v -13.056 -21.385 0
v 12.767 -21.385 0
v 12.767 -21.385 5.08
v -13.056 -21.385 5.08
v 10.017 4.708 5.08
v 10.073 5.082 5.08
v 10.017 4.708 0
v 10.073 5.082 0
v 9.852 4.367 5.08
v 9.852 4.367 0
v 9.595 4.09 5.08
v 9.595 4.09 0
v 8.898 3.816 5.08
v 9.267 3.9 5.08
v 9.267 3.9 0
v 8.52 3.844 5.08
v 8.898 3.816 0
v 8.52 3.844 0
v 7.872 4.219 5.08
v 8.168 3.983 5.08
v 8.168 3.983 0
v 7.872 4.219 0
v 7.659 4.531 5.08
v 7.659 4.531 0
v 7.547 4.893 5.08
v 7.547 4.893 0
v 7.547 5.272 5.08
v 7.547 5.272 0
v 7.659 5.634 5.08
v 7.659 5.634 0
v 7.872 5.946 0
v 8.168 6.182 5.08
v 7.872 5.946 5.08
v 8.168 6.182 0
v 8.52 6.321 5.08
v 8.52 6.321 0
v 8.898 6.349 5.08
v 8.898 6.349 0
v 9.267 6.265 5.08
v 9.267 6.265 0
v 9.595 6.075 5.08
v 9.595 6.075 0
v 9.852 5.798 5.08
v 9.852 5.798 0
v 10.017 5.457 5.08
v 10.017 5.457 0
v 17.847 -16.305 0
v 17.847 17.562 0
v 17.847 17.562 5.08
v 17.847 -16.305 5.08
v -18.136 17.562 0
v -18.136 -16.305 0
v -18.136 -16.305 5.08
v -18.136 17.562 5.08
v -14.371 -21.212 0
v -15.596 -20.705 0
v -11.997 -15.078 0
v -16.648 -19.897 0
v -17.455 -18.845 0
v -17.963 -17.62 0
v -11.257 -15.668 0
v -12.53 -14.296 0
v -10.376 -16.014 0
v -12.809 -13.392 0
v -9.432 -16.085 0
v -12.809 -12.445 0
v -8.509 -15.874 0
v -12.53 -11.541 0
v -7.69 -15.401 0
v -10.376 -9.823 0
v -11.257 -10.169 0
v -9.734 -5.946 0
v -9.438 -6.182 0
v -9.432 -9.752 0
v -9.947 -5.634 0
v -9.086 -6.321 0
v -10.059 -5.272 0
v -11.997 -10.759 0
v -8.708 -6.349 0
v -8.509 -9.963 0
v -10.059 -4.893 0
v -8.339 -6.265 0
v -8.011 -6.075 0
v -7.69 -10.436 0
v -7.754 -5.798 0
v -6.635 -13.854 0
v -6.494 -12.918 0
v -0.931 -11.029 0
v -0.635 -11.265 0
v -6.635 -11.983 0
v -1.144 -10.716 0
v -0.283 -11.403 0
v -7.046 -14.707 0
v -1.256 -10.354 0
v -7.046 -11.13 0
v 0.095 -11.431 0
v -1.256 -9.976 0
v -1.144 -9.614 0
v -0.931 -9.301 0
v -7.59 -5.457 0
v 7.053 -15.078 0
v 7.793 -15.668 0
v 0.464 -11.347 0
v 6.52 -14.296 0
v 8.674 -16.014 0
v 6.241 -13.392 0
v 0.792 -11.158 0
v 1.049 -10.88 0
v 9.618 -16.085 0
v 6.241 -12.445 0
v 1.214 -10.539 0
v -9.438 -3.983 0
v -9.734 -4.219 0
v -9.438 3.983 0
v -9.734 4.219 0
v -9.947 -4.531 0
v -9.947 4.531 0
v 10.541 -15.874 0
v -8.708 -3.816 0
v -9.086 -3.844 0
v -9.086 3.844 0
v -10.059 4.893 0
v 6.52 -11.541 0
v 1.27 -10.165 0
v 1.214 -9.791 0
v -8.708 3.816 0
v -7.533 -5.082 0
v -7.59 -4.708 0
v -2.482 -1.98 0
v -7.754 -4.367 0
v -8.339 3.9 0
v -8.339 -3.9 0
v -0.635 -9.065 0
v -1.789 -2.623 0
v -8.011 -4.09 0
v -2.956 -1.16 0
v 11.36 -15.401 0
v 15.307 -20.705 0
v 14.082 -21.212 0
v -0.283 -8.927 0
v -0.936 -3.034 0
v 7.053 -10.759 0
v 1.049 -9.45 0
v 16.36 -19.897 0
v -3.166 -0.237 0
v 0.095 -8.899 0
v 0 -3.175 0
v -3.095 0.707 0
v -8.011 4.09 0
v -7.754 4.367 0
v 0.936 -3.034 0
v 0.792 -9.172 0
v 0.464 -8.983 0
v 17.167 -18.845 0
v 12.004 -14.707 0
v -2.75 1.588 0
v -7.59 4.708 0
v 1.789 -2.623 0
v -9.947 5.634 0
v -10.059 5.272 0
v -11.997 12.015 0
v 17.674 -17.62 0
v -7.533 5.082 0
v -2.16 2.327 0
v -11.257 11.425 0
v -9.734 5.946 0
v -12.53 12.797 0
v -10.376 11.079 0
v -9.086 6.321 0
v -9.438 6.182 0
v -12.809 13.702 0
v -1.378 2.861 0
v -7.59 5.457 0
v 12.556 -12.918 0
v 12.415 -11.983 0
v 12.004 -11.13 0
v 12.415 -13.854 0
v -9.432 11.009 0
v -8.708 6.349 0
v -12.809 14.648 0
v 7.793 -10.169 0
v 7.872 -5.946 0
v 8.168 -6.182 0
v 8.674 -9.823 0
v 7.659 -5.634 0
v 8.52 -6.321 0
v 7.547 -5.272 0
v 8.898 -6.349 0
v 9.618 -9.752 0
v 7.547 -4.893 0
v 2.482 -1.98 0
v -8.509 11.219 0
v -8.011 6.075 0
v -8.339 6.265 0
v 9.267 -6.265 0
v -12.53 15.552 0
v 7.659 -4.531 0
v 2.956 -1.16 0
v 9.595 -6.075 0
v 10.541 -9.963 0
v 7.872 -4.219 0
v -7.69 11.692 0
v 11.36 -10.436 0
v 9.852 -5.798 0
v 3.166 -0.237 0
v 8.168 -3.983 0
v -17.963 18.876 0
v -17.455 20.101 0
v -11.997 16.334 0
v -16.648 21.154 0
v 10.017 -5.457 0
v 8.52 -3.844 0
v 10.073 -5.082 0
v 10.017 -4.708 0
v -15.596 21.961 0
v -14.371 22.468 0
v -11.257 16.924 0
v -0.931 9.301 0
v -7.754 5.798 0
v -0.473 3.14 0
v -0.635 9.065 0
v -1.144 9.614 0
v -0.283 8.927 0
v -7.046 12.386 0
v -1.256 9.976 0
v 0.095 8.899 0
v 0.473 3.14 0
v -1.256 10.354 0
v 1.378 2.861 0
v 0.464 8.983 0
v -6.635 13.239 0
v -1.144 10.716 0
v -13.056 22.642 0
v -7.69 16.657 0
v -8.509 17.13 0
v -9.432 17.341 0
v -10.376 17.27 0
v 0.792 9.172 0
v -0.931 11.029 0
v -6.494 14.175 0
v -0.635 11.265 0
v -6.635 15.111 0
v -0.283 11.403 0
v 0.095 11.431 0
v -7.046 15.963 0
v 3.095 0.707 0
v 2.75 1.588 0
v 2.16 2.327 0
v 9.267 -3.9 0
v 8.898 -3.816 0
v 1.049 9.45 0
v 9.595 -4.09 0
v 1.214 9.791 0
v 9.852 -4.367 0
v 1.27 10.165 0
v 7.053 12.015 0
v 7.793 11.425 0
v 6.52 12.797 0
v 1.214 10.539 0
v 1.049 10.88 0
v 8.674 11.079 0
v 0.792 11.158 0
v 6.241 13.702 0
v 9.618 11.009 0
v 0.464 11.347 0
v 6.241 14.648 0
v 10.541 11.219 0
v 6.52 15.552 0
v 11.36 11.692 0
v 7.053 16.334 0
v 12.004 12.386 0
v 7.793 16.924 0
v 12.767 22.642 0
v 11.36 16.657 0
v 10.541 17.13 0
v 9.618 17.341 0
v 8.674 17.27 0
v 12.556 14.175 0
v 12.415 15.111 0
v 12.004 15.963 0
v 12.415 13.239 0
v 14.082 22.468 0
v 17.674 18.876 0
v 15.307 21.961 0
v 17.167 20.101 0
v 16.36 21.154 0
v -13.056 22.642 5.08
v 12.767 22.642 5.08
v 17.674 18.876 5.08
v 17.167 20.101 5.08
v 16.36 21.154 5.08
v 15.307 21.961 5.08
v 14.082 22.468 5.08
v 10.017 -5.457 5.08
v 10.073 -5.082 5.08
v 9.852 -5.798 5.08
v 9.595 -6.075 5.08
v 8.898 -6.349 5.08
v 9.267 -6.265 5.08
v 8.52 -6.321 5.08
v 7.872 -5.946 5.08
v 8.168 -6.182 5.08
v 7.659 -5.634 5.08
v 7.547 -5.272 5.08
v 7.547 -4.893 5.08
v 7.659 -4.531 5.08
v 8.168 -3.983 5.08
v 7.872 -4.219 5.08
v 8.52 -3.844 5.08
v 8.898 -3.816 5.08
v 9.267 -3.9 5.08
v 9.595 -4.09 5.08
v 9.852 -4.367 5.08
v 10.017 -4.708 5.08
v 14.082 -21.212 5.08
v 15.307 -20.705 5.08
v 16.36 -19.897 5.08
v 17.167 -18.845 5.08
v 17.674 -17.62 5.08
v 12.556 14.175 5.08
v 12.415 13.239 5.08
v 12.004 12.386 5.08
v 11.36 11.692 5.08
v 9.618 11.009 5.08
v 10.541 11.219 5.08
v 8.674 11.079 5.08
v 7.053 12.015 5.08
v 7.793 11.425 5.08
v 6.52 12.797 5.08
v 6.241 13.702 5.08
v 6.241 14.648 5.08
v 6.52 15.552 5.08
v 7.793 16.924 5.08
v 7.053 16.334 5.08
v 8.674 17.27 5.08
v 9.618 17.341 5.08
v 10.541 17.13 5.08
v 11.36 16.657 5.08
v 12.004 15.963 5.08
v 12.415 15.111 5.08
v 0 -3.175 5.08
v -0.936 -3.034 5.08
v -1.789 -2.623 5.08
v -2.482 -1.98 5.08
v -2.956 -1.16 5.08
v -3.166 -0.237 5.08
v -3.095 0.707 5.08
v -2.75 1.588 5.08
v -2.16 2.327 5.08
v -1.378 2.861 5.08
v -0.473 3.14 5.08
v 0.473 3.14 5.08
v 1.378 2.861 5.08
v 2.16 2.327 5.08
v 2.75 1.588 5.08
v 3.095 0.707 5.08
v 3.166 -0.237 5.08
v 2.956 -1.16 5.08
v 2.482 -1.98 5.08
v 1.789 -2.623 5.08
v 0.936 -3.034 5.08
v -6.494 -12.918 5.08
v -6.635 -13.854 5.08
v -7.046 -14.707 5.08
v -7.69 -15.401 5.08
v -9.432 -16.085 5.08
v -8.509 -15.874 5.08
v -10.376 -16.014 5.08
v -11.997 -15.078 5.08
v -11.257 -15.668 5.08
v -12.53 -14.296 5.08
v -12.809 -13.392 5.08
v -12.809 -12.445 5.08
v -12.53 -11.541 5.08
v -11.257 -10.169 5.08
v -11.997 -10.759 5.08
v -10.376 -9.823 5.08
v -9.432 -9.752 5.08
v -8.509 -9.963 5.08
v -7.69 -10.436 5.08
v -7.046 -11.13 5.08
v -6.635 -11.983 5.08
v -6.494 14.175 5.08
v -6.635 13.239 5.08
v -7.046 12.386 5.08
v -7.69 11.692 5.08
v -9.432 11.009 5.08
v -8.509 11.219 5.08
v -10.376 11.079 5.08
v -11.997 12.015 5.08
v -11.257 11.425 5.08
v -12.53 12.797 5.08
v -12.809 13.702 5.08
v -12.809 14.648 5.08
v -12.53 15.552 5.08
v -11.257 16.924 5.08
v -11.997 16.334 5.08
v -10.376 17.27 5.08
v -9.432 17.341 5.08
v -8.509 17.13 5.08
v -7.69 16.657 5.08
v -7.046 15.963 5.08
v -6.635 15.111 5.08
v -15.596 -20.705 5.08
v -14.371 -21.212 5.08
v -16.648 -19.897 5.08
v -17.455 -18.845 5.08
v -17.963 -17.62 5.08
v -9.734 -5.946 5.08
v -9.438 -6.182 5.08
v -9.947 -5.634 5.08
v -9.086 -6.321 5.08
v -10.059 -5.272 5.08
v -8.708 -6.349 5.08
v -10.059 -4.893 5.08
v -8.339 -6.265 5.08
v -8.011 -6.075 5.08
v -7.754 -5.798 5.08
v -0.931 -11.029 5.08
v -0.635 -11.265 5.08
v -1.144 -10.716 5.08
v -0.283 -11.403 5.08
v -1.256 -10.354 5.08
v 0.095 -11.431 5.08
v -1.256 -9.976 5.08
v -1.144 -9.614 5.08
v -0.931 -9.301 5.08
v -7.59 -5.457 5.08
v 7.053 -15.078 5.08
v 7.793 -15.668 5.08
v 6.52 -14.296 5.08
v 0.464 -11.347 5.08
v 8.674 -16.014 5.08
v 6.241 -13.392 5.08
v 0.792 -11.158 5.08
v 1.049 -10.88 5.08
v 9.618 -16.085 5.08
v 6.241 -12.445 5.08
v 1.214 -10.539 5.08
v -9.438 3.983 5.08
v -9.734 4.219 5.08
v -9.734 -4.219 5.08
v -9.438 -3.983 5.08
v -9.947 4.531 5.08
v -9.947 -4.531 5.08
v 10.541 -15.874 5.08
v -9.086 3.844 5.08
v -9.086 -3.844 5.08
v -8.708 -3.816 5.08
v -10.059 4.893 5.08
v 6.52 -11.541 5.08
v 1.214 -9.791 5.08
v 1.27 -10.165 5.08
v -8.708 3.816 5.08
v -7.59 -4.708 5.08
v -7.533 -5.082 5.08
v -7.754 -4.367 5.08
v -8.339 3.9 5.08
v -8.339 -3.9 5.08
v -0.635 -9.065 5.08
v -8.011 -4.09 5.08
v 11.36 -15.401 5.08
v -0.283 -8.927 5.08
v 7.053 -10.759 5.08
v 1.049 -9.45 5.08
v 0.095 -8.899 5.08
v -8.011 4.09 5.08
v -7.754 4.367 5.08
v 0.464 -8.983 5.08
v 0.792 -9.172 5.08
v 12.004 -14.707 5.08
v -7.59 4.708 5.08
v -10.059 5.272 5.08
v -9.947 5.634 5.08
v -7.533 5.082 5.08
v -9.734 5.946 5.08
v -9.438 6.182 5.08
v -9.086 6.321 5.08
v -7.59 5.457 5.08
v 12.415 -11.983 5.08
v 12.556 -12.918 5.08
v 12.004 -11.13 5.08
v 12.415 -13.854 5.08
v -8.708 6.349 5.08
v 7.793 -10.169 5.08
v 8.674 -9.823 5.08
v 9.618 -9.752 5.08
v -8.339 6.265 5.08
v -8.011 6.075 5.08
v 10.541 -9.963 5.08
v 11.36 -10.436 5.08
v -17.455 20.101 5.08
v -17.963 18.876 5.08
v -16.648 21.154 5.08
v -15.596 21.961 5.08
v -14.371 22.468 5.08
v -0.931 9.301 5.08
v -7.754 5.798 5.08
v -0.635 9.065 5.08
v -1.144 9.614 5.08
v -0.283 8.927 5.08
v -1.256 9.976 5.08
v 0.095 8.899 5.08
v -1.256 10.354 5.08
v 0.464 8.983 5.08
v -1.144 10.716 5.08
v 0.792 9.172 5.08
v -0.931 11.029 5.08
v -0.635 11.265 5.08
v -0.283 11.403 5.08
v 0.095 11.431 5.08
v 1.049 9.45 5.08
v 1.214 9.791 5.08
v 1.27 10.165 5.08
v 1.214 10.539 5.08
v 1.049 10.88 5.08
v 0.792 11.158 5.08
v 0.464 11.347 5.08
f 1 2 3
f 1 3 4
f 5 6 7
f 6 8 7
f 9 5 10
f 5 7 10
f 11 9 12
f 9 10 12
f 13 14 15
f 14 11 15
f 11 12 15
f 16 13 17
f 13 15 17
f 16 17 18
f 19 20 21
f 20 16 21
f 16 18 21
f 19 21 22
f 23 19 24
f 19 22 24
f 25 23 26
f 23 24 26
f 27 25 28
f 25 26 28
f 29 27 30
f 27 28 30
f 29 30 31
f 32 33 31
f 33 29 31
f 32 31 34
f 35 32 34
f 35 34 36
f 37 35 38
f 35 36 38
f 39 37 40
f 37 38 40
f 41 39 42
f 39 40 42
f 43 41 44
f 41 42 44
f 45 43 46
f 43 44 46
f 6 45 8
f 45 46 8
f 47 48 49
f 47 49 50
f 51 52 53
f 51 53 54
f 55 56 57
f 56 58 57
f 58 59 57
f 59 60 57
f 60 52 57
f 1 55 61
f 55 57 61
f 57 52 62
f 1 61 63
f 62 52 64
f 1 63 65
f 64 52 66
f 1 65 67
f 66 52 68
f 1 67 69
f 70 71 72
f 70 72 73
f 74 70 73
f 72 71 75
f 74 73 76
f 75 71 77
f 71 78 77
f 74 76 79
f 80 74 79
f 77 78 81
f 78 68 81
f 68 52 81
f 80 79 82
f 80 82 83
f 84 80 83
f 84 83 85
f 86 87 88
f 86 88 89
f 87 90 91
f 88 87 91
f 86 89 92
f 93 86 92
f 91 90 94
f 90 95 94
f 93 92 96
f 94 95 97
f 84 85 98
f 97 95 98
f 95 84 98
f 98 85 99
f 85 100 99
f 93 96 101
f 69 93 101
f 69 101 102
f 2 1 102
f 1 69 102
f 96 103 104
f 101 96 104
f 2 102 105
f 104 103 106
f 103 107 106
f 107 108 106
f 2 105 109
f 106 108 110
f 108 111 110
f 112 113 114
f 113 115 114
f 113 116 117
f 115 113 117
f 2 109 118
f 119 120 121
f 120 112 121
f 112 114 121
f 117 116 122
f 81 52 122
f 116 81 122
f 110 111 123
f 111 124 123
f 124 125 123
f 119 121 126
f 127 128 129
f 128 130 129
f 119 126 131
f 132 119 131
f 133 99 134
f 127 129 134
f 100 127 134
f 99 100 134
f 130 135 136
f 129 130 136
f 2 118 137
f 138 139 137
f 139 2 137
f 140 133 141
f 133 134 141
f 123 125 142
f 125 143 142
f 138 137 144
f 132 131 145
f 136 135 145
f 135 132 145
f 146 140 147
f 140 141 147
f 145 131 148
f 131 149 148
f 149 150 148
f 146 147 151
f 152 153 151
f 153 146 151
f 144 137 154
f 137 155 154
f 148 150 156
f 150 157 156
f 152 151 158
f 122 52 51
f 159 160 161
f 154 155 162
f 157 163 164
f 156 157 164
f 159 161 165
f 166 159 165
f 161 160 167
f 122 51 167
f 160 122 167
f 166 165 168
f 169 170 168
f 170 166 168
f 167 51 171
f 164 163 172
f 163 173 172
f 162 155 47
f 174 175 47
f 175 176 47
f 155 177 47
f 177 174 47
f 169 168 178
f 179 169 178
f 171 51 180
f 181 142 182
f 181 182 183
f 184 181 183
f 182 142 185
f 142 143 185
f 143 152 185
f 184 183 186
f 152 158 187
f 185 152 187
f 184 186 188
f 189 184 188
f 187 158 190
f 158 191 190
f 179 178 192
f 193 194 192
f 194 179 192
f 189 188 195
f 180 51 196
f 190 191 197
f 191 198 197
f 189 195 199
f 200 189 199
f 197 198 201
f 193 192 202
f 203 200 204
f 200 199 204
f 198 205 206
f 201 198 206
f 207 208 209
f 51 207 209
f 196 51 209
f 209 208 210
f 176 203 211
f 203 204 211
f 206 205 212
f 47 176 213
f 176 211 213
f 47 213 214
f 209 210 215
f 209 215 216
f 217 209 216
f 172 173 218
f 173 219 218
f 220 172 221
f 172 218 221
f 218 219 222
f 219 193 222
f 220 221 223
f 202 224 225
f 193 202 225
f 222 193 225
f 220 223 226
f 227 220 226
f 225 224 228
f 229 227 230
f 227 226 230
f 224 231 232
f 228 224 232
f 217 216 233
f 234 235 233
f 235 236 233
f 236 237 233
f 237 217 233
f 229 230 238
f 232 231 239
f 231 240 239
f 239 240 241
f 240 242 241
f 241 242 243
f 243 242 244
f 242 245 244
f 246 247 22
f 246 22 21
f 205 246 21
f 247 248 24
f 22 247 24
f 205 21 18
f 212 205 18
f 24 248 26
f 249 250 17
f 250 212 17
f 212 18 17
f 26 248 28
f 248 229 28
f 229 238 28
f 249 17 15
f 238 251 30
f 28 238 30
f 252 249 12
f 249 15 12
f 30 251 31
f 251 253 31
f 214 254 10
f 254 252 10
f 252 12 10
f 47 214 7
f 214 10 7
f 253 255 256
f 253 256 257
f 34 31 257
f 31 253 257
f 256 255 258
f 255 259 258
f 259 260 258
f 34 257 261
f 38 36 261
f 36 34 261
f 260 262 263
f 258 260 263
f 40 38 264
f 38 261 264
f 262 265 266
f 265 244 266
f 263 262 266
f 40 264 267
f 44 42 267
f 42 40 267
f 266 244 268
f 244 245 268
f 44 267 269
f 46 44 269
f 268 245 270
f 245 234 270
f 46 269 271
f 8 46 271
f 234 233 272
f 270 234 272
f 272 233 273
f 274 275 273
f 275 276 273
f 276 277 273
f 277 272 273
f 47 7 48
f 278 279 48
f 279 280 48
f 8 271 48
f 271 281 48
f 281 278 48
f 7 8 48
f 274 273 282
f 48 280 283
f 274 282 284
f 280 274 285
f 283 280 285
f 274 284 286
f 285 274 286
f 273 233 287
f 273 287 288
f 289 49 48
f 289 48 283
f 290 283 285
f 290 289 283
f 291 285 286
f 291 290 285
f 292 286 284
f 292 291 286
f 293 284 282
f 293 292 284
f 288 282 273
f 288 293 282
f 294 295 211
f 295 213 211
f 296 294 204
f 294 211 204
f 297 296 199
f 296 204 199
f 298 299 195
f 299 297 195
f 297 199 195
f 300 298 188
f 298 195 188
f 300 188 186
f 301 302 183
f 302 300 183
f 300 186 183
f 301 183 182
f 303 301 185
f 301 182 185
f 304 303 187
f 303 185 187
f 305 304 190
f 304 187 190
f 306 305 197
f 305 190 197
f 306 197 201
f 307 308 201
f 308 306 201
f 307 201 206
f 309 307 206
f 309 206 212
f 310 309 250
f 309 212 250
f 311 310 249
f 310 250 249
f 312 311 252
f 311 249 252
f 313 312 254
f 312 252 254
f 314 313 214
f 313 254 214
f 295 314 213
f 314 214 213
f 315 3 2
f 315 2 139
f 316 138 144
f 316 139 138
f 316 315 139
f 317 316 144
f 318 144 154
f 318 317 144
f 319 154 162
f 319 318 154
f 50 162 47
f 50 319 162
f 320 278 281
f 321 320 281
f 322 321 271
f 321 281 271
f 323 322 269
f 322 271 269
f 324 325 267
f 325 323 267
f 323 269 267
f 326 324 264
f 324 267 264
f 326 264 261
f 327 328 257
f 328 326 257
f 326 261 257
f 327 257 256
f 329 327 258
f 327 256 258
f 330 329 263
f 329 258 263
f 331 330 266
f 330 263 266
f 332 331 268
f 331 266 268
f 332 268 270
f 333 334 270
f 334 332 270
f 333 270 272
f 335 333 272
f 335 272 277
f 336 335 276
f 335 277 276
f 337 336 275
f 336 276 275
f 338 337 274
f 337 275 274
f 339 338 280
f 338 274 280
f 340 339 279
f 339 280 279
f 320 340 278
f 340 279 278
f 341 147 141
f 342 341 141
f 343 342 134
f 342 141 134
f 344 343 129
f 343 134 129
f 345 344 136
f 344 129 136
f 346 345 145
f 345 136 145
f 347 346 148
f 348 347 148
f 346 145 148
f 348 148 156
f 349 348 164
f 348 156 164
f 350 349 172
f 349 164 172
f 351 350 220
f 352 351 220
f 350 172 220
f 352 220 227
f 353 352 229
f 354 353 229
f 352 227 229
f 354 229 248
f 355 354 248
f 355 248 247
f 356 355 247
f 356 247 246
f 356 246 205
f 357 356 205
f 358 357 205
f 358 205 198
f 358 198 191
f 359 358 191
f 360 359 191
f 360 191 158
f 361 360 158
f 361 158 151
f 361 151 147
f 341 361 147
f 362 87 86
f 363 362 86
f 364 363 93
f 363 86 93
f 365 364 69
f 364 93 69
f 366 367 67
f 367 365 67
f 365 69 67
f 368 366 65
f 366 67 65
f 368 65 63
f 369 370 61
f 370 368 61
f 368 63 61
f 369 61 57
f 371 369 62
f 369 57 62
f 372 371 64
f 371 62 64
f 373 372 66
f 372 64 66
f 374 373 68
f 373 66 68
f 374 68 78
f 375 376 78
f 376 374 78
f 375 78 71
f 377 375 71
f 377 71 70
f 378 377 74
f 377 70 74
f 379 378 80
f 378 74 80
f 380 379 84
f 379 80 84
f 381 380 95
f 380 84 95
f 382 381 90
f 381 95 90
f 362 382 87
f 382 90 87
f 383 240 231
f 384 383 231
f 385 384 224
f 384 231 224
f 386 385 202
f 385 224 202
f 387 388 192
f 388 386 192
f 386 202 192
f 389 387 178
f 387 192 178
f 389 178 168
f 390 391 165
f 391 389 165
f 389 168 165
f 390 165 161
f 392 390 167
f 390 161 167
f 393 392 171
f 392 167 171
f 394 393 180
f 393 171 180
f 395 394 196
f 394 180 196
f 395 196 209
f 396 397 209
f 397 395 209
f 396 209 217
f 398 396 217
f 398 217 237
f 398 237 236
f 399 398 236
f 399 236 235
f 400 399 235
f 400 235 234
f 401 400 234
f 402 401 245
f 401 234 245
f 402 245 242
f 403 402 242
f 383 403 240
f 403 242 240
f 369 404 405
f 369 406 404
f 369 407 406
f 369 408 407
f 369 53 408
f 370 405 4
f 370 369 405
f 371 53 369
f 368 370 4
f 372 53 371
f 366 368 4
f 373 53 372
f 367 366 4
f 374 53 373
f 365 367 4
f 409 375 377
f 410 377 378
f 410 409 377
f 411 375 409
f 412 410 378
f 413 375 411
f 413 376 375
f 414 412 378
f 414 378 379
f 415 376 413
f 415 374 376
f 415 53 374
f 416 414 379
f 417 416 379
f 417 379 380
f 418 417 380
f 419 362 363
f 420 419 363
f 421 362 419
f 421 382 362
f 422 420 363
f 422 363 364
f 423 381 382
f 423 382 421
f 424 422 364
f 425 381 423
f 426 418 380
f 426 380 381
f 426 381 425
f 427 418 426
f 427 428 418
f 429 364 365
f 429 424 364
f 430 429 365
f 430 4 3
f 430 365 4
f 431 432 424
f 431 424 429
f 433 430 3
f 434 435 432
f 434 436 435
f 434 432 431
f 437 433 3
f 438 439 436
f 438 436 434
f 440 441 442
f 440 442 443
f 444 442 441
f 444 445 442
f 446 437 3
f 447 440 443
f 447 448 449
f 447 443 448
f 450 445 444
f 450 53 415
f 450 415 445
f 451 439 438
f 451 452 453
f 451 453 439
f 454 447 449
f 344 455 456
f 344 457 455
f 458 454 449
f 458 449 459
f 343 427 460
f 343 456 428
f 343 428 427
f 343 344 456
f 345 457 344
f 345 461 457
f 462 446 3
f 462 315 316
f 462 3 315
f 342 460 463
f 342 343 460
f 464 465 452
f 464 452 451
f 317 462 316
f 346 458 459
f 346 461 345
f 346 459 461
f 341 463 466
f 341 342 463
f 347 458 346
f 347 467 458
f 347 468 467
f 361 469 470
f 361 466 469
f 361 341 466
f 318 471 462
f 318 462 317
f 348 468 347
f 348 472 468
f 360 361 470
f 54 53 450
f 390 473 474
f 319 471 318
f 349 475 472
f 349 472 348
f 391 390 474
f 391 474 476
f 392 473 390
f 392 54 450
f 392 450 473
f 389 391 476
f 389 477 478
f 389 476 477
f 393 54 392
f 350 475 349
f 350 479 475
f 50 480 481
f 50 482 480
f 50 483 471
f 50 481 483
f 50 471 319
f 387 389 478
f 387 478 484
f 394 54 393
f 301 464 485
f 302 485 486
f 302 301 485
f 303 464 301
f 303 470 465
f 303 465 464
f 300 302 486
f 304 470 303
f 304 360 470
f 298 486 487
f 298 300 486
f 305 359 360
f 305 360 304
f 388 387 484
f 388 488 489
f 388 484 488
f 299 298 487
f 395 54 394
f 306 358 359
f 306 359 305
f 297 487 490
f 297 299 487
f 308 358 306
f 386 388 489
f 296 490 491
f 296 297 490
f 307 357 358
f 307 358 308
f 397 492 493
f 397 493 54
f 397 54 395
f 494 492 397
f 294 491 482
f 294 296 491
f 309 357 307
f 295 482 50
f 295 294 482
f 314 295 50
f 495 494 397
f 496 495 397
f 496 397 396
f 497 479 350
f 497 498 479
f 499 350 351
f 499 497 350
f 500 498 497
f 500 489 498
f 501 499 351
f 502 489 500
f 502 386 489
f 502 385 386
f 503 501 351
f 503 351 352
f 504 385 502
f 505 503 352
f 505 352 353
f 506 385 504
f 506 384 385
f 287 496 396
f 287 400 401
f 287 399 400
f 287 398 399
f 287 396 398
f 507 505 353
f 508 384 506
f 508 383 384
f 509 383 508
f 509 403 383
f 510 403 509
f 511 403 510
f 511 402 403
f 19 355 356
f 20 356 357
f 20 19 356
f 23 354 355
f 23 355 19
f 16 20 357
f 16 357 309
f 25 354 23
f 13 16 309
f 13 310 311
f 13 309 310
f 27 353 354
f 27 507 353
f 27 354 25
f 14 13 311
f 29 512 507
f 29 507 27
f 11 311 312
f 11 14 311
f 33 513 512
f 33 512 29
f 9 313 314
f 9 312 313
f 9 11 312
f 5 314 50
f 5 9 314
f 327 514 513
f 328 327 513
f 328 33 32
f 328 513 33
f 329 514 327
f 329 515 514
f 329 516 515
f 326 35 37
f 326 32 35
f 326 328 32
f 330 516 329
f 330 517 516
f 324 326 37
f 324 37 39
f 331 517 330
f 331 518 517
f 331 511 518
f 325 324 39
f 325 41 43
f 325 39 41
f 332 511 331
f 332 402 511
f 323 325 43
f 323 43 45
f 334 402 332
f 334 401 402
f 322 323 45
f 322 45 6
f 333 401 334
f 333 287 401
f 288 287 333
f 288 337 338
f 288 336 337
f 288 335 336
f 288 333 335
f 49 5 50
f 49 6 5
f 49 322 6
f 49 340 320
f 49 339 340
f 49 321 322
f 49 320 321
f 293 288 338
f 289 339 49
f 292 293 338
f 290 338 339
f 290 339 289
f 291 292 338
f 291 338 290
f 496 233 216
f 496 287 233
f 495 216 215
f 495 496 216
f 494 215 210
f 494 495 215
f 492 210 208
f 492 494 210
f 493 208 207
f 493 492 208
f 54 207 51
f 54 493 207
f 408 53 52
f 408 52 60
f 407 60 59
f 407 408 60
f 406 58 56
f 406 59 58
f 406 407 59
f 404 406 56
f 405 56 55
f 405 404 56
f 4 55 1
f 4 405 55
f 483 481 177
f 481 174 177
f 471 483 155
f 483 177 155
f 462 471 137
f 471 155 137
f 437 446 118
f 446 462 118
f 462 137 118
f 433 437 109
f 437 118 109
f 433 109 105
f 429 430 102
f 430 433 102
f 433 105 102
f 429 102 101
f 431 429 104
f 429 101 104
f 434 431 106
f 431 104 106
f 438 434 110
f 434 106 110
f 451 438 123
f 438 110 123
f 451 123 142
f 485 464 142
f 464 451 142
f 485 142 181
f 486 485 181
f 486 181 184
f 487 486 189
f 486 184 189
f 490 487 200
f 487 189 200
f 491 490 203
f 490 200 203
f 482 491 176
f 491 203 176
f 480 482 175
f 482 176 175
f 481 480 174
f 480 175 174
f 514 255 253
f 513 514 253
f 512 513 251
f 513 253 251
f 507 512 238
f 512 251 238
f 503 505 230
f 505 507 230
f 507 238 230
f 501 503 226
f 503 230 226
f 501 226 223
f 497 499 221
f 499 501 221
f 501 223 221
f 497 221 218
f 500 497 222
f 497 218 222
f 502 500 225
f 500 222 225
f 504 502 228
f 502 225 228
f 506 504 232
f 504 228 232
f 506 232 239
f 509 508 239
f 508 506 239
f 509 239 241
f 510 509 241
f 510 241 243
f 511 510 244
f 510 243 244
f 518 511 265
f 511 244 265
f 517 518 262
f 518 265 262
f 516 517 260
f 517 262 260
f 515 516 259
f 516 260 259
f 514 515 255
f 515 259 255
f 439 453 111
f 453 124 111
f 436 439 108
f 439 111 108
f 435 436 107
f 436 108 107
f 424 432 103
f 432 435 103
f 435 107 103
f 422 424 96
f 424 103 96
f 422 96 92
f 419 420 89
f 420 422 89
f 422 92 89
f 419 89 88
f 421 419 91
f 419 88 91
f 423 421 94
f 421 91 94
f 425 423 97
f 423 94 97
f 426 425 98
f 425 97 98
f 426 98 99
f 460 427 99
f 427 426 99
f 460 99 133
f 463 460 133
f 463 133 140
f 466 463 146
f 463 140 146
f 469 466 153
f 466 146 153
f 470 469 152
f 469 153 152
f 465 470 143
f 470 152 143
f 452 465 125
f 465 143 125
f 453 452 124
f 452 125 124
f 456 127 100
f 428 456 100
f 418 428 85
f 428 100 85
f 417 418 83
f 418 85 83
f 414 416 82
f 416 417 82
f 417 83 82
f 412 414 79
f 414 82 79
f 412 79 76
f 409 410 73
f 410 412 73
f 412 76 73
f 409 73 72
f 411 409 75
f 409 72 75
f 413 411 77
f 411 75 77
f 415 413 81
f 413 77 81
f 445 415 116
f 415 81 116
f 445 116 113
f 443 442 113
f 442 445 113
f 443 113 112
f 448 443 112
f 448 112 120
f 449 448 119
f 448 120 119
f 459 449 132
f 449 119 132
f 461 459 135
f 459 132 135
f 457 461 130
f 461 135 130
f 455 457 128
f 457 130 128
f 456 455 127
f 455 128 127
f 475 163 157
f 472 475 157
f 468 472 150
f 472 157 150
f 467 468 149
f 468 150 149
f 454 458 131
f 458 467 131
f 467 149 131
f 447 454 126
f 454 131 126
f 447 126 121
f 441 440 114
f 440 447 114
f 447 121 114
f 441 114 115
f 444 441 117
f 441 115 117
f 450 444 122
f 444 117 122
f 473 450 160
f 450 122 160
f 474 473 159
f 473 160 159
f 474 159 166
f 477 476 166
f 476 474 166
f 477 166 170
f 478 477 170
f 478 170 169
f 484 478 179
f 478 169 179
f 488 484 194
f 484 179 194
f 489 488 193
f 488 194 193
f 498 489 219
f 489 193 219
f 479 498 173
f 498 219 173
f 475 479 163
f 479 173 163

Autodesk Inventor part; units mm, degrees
ref_plane "YZ Plane" through (0, 0, 0) normal (1, 0, 0) x (0, 1, 0)
ref_plane "XZ Plane" through (0, 0, 0) normal (0, 1, 0) x (-1, 0, 0)
ref_plane "XY Plane" through (0, 0, 0) normal (0, 0, 1) x (1, 0, 0)
sketch "Sketch1" plane through (0, 0, 0) normal (0, 0, 1) x (1, 0, 0)
  circle A0 centre (-9.6692, -12.9185) radius 3.175
  circle A1 centre (9.3808, -12.9185) radius 3.175
  circle A2 centre (9.3808, 14.1748) radius 3.175
  circle A3 centre (-9.6692, 14.1748) radius 3.175
  line L0 (-9.6692, 14.1748) -> (9.3808, 14.1748) construction
  line L1 (9.3808, 14.1748) -> (9.3808, -12.9185) construction
  line L2 (9.3808, -12.9185) -> (-9.6692, -12.9185) construction
  line L3 (-9.6692, -12.9185) -> (-9.6692, 14.1748) construction
  line L4 (-18.1359, 22.6415) -> (17.8474, 22.6415)
  line L5 (17.8474, 22.6415) -> (17.8474, -21.3852)
  line L6 (17.8474, -21.3852) -> (-18.1359, -21.3852)
  line L7 (-18.1359, -21.3852) -> (-18.1359, 22.6415)
  circle A4 centre (0, 0) radius 10.165 construction
  circle A5 centre (0, 10.165) radius 1.27
  circle A6 centre (-8.8031, 5.0825) radius 1.27
  circle A7 centre (-8.8031, -5.0825) radius 1.27
  circle A8 centre (0, -10.165) radius 1.27
  circle A9 centre (8.8031, -5.0825) radius 1.27
  circle A10 centre (8.8031, 5.0825) radius 1.27
  dimension "d7" = 20.3299
  dimension "d0" = 8.4667
  dimension "d1" = 8.4667
  dimension "d2" = 8.4667
  dimension "d3" = 8.4667
  dimension "d4" = 6.35
  dimension "d8" = 2.54
  dimension "d11" = 360
extrude "Plate2" add sketch "Sketch1" along normal blind 5.08
fillet "Fillet1" radius 5.08 4 edges at (-18.1359, -21.3852, 2.54) (17.8474, -21.3852, 2.54) (17.8474, 22.6415, 2.54) (-18.1359, 22.6415, 2.54)
sketch "Sketch4" plane through (0, 0, 5.08) normal (0, 0, 1) x (1, 0, 0)
  point P0 (0, 0)
hole "Hole1" at (0, 0, 5.08) direction (0, 0, -1) diameter 6.35 end through all
equation "\"d18\" = Thickness"
equation "\"d5\" = Thickness"
equation "\"BendRadius\" = Thickness"
equation "\"BendReliefWidth\" = Thickness"
equation "\"BendReliefDepth\" = 0.5 * Thickness"
equation "\"CornerReliefSize\" = 4 * Thickness"
equation "\"MinimumRemnant\" = 2 * Thickness"
equation "\"TransitionRadius\" = BendRadius"
equation "\"JacobiRadiusSize\" = BendRadius"
equation "\"GapSize\" = Thickness"
equation "\"Thickness\" = 5.08"
properties part number "UpperArmShoulderMount"
